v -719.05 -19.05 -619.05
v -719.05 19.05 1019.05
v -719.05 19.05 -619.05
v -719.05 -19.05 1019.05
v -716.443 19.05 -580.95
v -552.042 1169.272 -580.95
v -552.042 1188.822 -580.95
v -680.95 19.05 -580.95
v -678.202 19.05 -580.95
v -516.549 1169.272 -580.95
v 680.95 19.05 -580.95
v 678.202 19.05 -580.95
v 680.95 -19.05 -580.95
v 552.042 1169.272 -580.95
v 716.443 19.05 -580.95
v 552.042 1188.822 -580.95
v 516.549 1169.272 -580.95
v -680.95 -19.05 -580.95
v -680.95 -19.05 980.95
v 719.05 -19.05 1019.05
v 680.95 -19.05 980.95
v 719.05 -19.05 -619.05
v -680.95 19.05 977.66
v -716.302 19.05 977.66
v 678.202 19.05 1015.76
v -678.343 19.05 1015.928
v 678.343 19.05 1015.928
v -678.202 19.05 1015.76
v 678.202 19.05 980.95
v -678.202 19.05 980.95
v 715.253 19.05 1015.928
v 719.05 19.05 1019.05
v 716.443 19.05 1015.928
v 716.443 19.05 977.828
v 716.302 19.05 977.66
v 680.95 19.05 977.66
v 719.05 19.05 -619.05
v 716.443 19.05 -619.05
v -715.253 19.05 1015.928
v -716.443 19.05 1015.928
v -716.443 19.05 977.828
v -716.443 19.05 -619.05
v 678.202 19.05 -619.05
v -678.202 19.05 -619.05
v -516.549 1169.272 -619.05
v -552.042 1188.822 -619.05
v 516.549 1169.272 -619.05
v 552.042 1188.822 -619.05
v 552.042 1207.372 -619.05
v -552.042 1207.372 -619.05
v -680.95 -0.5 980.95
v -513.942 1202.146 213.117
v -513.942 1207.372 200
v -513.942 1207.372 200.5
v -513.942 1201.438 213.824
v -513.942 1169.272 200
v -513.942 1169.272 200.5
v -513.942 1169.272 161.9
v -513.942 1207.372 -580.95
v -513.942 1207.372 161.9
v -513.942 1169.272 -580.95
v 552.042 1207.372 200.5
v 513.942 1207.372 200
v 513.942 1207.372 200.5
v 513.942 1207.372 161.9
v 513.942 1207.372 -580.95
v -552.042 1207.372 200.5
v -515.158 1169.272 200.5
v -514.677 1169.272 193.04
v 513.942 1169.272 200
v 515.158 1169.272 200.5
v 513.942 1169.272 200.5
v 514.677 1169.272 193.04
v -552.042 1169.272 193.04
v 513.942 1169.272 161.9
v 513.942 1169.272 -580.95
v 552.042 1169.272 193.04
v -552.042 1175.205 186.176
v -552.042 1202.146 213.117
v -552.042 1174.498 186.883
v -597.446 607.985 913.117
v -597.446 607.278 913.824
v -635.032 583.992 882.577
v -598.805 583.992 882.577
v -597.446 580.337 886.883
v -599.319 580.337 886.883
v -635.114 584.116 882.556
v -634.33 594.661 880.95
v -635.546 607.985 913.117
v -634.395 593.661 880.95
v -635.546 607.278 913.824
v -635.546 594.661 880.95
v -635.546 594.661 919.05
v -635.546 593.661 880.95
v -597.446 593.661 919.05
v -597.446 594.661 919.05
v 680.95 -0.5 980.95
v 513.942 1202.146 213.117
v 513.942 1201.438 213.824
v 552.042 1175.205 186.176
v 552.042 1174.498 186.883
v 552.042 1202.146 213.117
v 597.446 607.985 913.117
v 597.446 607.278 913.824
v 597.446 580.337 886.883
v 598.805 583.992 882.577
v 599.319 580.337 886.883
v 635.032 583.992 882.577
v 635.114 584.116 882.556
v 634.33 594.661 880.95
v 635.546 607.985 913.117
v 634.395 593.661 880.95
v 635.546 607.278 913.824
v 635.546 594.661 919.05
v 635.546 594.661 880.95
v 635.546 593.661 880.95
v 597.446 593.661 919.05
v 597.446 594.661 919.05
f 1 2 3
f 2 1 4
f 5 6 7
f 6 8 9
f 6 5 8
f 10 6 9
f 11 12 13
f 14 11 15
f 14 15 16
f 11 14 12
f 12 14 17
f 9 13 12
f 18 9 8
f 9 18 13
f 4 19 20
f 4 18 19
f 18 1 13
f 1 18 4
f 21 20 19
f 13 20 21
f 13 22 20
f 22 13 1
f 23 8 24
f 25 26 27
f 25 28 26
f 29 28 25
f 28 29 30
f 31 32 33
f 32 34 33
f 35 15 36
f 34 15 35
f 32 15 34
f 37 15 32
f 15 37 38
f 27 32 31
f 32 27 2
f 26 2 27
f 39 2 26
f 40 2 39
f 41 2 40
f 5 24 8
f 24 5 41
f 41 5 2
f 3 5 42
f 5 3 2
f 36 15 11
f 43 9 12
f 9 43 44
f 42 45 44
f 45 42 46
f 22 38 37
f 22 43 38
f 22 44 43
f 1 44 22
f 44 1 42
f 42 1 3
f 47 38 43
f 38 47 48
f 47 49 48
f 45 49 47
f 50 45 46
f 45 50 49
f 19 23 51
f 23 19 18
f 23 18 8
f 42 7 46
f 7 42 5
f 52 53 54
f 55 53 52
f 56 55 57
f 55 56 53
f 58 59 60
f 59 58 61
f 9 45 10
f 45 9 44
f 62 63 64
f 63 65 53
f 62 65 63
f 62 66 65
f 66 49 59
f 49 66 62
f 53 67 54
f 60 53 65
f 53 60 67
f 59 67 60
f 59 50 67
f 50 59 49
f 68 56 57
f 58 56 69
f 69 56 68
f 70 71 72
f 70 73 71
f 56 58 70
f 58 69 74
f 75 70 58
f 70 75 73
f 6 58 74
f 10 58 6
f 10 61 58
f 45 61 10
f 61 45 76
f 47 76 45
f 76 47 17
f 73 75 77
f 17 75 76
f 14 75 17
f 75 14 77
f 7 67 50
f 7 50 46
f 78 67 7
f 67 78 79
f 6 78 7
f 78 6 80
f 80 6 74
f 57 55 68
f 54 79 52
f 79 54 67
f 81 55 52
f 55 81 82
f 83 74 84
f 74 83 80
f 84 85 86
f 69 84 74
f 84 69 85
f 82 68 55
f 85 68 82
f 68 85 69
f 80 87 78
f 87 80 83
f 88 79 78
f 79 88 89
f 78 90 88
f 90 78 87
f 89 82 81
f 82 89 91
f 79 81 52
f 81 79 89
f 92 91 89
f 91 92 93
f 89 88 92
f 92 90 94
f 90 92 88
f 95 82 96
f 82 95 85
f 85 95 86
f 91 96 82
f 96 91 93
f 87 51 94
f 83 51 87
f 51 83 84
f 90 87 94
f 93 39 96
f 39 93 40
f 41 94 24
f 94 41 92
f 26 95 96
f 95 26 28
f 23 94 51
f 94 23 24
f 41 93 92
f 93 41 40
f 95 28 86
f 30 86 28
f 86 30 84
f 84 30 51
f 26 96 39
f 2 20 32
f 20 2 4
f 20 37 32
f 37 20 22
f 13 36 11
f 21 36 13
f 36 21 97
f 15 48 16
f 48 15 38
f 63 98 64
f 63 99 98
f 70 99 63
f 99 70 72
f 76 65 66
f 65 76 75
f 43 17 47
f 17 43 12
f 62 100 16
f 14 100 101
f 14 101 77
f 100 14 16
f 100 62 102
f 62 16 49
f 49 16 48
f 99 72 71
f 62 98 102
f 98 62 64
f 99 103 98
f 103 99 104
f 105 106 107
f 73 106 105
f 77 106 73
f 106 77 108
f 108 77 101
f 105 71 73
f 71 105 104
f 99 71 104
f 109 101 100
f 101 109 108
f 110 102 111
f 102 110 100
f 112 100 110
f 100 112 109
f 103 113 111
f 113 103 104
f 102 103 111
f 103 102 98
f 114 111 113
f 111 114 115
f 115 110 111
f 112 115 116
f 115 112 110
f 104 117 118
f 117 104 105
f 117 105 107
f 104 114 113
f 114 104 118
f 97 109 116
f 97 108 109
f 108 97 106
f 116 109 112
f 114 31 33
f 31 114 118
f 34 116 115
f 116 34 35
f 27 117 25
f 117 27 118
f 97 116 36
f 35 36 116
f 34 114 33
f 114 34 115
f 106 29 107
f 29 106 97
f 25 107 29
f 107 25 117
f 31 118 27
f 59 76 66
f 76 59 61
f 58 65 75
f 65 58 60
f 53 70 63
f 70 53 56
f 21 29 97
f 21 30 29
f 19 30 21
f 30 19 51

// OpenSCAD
/**
 The roll cage is primarily designed to reduce simulator sickness,
 by providing clear high contrast co-moving geometry in peripheral vision.

 Looking cool helps too.
 
 Uses Unity Y-up coordinate system.  Vehicle drives in +Z direction.
 
 Press F6 to render, save as STL, load in MeshLab, save as OBJ, import into Unity.
*/

inch=25.4; // file units == millimeters
tube=1.5*inch; // 1.5 inch square tube (for low poly)


side=700.0;
high=1200.0;
front=1000.0;
slope=200.0;
back=-600.0;
pts=[
	[side,0,back,0],
	[side,0,back,-90],
	[side,high,back,-90],
	[side,high,back,0],
	[side,high,slope,0],
	[side,high,slope,+45],
	[side,high/2,front-100.0,45],
	[side,high/2,front-100.0,90],
	[side,0,front,90],
	[side,0,front,0],
];
npts=10;
cage_sidetilt=8;

module translate_point(p) {
	translate([pts[p][0],0,0])
	rotate([0,0,cage_sidetilt])
	translate([0,pts[p][1],pts[p][2]])
	rotate([0,0,-cage_sidetilt])
		children();
}

// Draw this vertex
module draw_point(p) {
	translate_point(p)
		rotate([pts[p][3],0,0])
			cube([tube,tube,1],center=true);
}

// Connect points p1 and p2 with a front-back bar
module draw_fbar(p1,p2) {
	hull() {
		draw_point(p1);
		draw_point(p2);
	}
}

// Draw a horizontal bar at this point
module draw_hbar(p) {
	hull() {
		for (leftright=[-1,+1]) scale([leftright,1,1])
		translate_point(p)
		cube([tube,tube,tube],center=true);
	}
}


for (leftright=[-1,+1]) scale([leftright,1,1])
{
	for (p=[0:npts-2]) {
		draw_fbar(p,p+1);
	}
	draw_fbar(npts-1,0);
}
draw_hbar(1);
draw_hbar(2);
translate([0,0,-tube/2]) draw_hbar(4);
draw_hbar(npts-1);
